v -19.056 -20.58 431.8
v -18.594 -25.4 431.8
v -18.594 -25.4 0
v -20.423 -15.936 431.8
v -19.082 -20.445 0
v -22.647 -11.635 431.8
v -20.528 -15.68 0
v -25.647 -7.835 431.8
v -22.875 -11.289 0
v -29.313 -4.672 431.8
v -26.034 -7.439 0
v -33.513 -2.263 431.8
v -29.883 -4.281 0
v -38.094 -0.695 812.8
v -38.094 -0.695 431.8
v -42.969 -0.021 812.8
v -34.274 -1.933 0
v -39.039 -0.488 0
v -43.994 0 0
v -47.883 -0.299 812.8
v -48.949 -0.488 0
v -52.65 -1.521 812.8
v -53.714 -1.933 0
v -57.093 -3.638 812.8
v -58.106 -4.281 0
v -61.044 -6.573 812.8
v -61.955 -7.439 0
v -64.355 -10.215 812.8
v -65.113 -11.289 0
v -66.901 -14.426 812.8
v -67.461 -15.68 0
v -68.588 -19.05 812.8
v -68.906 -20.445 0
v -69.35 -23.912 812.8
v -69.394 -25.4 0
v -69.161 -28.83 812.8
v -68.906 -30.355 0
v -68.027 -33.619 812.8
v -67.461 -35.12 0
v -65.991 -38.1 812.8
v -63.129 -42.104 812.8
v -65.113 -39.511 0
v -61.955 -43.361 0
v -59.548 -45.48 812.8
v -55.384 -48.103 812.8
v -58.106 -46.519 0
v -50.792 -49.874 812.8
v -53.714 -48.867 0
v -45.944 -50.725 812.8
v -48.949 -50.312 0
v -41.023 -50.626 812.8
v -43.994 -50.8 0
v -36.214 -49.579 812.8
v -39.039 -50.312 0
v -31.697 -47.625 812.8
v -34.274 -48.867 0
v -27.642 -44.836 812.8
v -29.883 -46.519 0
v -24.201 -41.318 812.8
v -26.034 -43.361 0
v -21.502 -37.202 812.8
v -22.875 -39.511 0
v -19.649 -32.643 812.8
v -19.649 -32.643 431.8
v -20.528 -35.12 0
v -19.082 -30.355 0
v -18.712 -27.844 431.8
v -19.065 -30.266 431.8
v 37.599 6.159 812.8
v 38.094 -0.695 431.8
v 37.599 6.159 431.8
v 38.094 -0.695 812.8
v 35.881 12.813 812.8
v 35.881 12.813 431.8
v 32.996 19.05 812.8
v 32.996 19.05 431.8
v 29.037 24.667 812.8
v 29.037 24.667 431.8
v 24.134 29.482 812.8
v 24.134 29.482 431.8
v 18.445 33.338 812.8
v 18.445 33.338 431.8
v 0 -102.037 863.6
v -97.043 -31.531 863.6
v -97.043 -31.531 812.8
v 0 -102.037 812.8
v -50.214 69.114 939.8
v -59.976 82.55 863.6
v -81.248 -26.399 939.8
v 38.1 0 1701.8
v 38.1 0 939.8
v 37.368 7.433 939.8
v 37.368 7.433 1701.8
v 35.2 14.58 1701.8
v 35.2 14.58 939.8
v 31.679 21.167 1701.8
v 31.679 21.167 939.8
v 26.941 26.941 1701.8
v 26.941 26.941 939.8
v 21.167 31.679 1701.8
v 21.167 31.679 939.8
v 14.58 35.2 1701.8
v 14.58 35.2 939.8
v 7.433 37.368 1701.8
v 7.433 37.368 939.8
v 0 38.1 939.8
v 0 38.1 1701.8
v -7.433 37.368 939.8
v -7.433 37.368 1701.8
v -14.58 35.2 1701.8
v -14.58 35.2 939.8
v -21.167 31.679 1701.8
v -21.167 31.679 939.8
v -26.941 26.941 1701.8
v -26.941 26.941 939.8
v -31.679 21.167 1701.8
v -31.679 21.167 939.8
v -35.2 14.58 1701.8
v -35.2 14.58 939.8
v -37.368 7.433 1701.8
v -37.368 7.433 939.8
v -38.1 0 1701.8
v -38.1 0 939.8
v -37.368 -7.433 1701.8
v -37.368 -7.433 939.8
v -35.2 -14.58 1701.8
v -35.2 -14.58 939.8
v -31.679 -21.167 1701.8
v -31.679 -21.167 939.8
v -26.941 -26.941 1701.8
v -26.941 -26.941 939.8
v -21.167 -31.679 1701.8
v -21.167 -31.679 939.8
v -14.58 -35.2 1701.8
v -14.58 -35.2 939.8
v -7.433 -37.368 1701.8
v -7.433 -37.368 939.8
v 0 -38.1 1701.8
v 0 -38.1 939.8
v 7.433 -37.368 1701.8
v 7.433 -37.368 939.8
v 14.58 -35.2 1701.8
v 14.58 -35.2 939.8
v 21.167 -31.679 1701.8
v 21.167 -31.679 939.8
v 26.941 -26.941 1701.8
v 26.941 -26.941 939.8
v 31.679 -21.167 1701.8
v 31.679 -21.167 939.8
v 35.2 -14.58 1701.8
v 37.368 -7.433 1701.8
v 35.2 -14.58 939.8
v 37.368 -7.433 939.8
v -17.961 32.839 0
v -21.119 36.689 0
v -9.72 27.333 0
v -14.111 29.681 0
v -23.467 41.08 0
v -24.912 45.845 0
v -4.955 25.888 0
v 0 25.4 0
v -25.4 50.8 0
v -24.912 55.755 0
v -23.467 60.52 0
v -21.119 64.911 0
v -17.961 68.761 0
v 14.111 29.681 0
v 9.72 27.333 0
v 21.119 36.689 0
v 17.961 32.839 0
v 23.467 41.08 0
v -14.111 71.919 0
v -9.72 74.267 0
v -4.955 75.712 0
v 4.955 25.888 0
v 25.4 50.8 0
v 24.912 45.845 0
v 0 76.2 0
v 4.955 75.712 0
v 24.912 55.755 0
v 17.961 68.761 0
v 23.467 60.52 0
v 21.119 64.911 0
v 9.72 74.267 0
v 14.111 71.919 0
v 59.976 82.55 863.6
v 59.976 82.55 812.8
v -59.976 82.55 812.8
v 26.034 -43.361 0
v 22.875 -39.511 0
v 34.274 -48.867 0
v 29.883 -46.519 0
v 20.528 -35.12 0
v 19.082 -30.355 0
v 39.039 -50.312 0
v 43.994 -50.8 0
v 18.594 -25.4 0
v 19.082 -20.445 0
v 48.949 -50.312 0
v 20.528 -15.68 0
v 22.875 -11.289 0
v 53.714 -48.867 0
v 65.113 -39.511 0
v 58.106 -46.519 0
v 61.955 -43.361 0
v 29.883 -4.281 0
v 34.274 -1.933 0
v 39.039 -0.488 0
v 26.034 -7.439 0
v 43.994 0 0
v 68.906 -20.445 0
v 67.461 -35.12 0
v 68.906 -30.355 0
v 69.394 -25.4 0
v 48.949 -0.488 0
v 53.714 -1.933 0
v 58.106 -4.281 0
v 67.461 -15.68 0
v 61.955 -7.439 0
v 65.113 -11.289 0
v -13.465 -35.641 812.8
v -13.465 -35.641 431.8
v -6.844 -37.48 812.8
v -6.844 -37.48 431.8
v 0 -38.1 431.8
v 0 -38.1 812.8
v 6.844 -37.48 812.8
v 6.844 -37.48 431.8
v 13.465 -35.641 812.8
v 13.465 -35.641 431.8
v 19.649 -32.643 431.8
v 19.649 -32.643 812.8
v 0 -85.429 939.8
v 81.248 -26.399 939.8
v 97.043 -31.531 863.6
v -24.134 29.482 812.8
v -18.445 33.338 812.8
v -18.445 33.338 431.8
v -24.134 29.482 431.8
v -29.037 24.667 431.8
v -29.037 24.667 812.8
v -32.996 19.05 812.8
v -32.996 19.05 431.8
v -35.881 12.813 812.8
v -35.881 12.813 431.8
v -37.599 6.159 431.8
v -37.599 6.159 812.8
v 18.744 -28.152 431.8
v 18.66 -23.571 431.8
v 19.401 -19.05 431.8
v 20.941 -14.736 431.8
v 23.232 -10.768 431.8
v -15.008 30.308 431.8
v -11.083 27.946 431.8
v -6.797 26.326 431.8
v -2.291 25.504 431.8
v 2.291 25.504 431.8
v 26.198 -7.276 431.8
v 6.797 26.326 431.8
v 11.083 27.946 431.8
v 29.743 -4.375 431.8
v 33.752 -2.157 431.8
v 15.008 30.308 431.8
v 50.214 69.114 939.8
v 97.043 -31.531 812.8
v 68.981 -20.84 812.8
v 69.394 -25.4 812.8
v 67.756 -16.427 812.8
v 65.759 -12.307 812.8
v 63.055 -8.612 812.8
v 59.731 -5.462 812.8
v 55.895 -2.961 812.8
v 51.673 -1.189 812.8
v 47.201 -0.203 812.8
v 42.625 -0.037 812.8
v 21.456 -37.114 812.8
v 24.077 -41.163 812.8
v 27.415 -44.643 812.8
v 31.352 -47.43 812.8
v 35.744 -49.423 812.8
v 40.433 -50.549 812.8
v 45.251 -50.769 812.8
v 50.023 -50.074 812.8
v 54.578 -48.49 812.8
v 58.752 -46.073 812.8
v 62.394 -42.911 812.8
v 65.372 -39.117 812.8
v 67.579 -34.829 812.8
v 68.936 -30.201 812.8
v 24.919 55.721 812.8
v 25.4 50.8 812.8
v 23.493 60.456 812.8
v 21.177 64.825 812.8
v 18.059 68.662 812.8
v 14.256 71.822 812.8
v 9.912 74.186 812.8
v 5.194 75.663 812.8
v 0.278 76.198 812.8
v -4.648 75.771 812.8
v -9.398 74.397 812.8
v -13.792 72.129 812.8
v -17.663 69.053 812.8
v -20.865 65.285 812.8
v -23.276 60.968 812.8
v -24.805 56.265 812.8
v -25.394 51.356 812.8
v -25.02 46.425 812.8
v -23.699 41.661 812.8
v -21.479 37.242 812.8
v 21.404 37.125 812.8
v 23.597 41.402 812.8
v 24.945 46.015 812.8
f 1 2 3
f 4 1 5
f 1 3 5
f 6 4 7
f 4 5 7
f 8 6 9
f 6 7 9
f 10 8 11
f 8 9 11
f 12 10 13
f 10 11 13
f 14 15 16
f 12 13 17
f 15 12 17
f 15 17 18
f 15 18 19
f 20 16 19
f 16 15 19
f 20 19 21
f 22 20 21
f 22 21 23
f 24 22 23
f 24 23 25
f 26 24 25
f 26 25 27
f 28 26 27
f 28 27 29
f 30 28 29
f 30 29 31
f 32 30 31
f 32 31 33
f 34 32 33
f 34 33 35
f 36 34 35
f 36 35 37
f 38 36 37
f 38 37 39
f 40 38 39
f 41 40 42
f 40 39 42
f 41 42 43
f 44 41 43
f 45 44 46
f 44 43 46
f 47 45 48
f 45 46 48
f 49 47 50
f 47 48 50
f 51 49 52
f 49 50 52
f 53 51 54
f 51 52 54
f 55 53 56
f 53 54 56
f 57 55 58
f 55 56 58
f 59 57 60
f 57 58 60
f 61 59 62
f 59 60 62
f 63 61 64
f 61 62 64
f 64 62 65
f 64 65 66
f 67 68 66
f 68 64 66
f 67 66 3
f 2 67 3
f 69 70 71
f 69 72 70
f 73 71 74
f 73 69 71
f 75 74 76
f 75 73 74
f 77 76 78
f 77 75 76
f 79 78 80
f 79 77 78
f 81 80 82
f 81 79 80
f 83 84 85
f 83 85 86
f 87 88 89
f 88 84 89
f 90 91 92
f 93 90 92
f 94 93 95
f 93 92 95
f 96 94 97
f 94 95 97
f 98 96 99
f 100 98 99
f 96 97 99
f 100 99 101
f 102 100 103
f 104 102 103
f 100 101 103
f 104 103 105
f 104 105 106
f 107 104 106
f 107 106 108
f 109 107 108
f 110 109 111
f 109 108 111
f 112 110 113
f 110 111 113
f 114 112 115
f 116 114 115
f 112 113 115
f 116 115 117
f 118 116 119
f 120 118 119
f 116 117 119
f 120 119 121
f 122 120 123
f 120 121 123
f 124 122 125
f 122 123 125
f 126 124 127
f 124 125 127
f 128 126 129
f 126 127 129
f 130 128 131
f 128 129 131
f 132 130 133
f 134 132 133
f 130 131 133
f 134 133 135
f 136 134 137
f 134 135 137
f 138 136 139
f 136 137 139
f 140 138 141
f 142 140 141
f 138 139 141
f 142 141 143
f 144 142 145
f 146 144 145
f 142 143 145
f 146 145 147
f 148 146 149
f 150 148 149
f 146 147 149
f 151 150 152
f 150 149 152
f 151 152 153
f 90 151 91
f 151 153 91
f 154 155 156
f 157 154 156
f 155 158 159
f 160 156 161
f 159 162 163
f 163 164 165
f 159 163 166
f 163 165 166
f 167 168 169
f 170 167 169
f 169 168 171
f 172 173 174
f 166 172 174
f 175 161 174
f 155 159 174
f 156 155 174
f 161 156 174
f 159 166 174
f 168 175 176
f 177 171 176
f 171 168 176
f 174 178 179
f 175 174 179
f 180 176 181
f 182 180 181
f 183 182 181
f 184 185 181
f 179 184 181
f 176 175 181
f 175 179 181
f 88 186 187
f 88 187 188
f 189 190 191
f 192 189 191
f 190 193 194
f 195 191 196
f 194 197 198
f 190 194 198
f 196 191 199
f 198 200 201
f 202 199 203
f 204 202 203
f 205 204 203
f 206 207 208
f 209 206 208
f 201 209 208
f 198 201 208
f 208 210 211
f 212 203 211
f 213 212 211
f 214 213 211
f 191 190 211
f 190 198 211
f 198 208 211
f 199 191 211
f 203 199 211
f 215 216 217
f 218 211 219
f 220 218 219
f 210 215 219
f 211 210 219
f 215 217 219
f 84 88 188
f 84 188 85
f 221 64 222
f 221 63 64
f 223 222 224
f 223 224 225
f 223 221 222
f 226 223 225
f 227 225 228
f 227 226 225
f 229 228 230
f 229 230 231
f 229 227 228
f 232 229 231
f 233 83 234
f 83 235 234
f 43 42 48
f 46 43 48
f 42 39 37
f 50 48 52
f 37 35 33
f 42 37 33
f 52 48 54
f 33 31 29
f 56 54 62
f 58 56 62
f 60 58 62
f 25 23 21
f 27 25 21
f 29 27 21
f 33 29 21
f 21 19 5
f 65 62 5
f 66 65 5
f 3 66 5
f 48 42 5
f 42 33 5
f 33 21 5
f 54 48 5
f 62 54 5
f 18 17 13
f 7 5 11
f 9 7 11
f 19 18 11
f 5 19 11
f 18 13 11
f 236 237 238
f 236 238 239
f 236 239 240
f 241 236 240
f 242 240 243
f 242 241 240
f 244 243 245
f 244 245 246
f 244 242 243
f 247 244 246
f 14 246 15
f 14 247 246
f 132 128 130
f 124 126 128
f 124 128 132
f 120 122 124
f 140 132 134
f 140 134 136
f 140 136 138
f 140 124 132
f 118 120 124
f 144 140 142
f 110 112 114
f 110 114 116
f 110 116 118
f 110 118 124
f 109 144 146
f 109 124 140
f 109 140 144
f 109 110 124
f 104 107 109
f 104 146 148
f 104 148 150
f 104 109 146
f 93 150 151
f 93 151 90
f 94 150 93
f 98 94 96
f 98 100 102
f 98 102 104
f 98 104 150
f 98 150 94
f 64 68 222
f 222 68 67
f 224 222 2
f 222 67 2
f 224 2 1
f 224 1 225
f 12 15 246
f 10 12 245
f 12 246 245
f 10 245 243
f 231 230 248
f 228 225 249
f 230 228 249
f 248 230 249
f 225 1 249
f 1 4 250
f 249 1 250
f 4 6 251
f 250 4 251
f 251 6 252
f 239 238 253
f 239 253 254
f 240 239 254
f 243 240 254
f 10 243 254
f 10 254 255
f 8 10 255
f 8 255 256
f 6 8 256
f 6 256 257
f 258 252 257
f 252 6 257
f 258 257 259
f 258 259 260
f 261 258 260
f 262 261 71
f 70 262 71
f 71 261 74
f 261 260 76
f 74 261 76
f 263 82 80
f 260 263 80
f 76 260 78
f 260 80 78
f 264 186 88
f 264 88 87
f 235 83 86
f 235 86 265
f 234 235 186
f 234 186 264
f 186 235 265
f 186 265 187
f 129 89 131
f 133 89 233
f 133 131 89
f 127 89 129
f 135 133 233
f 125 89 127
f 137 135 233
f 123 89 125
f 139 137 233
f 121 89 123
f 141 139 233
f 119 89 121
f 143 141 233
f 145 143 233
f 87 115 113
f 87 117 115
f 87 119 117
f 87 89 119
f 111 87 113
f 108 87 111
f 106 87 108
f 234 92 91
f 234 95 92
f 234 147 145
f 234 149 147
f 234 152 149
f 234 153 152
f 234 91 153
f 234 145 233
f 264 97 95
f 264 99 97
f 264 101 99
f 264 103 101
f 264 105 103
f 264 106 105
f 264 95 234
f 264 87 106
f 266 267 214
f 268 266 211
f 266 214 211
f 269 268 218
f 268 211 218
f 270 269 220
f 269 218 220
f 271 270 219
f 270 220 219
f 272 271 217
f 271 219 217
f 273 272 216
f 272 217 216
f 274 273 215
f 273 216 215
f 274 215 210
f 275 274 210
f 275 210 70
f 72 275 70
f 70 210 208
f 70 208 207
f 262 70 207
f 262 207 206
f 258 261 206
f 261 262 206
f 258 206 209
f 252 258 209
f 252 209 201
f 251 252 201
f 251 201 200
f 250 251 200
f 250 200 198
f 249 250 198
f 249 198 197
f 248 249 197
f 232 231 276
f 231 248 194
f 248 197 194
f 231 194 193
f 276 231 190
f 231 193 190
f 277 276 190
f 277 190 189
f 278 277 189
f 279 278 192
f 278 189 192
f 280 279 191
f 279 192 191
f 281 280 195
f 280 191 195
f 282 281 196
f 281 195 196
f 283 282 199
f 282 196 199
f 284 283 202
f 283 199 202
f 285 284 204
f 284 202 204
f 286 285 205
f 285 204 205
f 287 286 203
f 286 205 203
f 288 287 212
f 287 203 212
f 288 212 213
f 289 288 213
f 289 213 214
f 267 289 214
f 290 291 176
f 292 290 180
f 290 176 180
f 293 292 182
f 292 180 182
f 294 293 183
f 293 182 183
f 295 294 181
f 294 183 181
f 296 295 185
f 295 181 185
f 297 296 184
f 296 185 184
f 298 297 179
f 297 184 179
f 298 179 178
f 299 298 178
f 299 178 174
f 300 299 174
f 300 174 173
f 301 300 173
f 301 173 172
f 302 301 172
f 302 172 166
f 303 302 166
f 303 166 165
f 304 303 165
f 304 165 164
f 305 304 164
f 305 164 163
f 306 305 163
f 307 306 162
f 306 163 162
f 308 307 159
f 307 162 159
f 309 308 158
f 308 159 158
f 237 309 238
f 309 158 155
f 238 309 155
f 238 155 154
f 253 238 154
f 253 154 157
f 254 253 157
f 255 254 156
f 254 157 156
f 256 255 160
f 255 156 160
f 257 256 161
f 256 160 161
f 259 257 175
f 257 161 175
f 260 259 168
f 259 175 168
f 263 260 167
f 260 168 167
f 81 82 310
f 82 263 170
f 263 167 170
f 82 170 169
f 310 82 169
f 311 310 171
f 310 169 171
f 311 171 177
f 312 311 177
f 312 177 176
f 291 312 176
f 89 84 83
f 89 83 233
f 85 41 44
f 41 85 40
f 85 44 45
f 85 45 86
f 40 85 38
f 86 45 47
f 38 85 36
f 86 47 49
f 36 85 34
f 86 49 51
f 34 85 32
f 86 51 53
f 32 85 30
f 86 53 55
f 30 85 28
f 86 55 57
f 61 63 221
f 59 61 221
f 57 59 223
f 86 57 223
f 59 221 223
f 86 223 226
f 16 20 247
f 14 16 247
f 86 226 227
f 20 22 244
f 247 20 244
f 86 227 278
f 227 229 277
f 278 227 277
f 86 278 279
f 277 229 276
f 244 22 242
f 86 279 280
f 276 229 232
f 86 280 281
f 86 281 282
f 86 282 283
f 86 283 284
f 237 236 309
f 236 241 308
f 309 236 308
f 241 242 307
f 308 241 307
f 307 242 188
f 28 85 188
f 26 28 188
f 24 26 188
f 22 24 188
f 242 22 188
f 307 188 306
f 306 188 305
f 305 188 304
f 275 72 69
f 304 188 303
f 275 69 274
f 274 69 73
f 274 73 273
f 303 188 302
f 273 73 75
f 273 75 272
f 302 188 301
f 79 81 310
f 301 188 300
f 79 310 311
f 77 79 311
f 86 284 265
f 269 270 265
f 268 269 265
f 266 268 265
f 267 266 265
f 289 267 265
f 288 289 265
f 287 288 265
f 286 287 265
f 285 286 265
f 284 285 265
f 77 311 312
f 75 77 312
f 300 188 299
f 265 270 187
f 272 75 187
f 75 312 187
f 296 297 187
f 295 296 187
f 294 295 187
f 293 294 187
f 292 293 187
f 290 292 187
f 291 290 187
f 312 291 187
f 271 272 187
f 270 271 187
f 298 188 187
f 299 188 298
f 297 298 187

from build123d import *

# Parameters (mm, degrees)
F0_R          = 25.4
F1_DEPTH      = 863.6
F2_R          = 25.4
F3_DEPTH      = 50.8
F3_DEPTH_BACK = 76.2
F3_TAPER_BACK = 10
F4_R          = 38.1
F5_DEPTH      = 762
F5_DEPTH_BACK = 508


with BuildPart() as f1:
    # F0 (on Top) → F1 (new body)
    with BuildSketch(Plane.XY):
        with Locations((0, 50.8)):
            Circle(F0_R)
    extrude(amount=F1_DEPTH)



with BuildPart() as f1b:
    # F0 (on Top) → F1, piece 2 (new body)
    with BuildSketch(Plane.XY):
        with Locations((-43.9940905122, -25.4)):
            Circle(F0_R)
    extrude(amount=F1_DEPTH)


with BuildPart() as f1c:
    # F0 (on Top) → F1, piece 3 (new body)
    with BuildSketch(Plane.XY):
        with Locations((43.9940905122, -25.4)):
            Circle(F0_R)
    extrude(amount=F1_DEPTH)


with BuildPart() as f1_1:
    add(f1.part)

    add(f1b.part)  # F3 merges F1b

    add(f1c.part)  # F3 merges F1c
    # F2 (on face) → F3 (join, two sides)
    with BuildSketch(Plane.XY.offset(863.6)) as f3_sk:
        Polygon((59.9760856868, 82.55), (-59.9760856868, 82.55), (-97.0433451535, -31.5312942287), (0, -102.0374115426), (97.0433451535, -31.5312942287), align=None)
        with Locations((-43.9940905122, -25.4)):
            Circle(F2_R, mode=Mode.SUBTRACT)
        with Locations((-43.9940905122, -25.4)):
            Circle(F2_R)
    extrude(amount=-F3_DEPTH)
    extrude(f3_sk.sketch, amount=F3_DEPTH_BACK, taper=F3_TAPER_BACK)

    # F4 (on face) → F5 (join, two sides)
    with BuildSketch(Plane.XY.offset(939.8)) as f5_sk:
        Circle(F4_R)
    extrude(amount=F5_DEPTH)
    extrude(f5_sk.sketch, amount=-F5_DEPTH_BACK)


solid = f1_1.part
